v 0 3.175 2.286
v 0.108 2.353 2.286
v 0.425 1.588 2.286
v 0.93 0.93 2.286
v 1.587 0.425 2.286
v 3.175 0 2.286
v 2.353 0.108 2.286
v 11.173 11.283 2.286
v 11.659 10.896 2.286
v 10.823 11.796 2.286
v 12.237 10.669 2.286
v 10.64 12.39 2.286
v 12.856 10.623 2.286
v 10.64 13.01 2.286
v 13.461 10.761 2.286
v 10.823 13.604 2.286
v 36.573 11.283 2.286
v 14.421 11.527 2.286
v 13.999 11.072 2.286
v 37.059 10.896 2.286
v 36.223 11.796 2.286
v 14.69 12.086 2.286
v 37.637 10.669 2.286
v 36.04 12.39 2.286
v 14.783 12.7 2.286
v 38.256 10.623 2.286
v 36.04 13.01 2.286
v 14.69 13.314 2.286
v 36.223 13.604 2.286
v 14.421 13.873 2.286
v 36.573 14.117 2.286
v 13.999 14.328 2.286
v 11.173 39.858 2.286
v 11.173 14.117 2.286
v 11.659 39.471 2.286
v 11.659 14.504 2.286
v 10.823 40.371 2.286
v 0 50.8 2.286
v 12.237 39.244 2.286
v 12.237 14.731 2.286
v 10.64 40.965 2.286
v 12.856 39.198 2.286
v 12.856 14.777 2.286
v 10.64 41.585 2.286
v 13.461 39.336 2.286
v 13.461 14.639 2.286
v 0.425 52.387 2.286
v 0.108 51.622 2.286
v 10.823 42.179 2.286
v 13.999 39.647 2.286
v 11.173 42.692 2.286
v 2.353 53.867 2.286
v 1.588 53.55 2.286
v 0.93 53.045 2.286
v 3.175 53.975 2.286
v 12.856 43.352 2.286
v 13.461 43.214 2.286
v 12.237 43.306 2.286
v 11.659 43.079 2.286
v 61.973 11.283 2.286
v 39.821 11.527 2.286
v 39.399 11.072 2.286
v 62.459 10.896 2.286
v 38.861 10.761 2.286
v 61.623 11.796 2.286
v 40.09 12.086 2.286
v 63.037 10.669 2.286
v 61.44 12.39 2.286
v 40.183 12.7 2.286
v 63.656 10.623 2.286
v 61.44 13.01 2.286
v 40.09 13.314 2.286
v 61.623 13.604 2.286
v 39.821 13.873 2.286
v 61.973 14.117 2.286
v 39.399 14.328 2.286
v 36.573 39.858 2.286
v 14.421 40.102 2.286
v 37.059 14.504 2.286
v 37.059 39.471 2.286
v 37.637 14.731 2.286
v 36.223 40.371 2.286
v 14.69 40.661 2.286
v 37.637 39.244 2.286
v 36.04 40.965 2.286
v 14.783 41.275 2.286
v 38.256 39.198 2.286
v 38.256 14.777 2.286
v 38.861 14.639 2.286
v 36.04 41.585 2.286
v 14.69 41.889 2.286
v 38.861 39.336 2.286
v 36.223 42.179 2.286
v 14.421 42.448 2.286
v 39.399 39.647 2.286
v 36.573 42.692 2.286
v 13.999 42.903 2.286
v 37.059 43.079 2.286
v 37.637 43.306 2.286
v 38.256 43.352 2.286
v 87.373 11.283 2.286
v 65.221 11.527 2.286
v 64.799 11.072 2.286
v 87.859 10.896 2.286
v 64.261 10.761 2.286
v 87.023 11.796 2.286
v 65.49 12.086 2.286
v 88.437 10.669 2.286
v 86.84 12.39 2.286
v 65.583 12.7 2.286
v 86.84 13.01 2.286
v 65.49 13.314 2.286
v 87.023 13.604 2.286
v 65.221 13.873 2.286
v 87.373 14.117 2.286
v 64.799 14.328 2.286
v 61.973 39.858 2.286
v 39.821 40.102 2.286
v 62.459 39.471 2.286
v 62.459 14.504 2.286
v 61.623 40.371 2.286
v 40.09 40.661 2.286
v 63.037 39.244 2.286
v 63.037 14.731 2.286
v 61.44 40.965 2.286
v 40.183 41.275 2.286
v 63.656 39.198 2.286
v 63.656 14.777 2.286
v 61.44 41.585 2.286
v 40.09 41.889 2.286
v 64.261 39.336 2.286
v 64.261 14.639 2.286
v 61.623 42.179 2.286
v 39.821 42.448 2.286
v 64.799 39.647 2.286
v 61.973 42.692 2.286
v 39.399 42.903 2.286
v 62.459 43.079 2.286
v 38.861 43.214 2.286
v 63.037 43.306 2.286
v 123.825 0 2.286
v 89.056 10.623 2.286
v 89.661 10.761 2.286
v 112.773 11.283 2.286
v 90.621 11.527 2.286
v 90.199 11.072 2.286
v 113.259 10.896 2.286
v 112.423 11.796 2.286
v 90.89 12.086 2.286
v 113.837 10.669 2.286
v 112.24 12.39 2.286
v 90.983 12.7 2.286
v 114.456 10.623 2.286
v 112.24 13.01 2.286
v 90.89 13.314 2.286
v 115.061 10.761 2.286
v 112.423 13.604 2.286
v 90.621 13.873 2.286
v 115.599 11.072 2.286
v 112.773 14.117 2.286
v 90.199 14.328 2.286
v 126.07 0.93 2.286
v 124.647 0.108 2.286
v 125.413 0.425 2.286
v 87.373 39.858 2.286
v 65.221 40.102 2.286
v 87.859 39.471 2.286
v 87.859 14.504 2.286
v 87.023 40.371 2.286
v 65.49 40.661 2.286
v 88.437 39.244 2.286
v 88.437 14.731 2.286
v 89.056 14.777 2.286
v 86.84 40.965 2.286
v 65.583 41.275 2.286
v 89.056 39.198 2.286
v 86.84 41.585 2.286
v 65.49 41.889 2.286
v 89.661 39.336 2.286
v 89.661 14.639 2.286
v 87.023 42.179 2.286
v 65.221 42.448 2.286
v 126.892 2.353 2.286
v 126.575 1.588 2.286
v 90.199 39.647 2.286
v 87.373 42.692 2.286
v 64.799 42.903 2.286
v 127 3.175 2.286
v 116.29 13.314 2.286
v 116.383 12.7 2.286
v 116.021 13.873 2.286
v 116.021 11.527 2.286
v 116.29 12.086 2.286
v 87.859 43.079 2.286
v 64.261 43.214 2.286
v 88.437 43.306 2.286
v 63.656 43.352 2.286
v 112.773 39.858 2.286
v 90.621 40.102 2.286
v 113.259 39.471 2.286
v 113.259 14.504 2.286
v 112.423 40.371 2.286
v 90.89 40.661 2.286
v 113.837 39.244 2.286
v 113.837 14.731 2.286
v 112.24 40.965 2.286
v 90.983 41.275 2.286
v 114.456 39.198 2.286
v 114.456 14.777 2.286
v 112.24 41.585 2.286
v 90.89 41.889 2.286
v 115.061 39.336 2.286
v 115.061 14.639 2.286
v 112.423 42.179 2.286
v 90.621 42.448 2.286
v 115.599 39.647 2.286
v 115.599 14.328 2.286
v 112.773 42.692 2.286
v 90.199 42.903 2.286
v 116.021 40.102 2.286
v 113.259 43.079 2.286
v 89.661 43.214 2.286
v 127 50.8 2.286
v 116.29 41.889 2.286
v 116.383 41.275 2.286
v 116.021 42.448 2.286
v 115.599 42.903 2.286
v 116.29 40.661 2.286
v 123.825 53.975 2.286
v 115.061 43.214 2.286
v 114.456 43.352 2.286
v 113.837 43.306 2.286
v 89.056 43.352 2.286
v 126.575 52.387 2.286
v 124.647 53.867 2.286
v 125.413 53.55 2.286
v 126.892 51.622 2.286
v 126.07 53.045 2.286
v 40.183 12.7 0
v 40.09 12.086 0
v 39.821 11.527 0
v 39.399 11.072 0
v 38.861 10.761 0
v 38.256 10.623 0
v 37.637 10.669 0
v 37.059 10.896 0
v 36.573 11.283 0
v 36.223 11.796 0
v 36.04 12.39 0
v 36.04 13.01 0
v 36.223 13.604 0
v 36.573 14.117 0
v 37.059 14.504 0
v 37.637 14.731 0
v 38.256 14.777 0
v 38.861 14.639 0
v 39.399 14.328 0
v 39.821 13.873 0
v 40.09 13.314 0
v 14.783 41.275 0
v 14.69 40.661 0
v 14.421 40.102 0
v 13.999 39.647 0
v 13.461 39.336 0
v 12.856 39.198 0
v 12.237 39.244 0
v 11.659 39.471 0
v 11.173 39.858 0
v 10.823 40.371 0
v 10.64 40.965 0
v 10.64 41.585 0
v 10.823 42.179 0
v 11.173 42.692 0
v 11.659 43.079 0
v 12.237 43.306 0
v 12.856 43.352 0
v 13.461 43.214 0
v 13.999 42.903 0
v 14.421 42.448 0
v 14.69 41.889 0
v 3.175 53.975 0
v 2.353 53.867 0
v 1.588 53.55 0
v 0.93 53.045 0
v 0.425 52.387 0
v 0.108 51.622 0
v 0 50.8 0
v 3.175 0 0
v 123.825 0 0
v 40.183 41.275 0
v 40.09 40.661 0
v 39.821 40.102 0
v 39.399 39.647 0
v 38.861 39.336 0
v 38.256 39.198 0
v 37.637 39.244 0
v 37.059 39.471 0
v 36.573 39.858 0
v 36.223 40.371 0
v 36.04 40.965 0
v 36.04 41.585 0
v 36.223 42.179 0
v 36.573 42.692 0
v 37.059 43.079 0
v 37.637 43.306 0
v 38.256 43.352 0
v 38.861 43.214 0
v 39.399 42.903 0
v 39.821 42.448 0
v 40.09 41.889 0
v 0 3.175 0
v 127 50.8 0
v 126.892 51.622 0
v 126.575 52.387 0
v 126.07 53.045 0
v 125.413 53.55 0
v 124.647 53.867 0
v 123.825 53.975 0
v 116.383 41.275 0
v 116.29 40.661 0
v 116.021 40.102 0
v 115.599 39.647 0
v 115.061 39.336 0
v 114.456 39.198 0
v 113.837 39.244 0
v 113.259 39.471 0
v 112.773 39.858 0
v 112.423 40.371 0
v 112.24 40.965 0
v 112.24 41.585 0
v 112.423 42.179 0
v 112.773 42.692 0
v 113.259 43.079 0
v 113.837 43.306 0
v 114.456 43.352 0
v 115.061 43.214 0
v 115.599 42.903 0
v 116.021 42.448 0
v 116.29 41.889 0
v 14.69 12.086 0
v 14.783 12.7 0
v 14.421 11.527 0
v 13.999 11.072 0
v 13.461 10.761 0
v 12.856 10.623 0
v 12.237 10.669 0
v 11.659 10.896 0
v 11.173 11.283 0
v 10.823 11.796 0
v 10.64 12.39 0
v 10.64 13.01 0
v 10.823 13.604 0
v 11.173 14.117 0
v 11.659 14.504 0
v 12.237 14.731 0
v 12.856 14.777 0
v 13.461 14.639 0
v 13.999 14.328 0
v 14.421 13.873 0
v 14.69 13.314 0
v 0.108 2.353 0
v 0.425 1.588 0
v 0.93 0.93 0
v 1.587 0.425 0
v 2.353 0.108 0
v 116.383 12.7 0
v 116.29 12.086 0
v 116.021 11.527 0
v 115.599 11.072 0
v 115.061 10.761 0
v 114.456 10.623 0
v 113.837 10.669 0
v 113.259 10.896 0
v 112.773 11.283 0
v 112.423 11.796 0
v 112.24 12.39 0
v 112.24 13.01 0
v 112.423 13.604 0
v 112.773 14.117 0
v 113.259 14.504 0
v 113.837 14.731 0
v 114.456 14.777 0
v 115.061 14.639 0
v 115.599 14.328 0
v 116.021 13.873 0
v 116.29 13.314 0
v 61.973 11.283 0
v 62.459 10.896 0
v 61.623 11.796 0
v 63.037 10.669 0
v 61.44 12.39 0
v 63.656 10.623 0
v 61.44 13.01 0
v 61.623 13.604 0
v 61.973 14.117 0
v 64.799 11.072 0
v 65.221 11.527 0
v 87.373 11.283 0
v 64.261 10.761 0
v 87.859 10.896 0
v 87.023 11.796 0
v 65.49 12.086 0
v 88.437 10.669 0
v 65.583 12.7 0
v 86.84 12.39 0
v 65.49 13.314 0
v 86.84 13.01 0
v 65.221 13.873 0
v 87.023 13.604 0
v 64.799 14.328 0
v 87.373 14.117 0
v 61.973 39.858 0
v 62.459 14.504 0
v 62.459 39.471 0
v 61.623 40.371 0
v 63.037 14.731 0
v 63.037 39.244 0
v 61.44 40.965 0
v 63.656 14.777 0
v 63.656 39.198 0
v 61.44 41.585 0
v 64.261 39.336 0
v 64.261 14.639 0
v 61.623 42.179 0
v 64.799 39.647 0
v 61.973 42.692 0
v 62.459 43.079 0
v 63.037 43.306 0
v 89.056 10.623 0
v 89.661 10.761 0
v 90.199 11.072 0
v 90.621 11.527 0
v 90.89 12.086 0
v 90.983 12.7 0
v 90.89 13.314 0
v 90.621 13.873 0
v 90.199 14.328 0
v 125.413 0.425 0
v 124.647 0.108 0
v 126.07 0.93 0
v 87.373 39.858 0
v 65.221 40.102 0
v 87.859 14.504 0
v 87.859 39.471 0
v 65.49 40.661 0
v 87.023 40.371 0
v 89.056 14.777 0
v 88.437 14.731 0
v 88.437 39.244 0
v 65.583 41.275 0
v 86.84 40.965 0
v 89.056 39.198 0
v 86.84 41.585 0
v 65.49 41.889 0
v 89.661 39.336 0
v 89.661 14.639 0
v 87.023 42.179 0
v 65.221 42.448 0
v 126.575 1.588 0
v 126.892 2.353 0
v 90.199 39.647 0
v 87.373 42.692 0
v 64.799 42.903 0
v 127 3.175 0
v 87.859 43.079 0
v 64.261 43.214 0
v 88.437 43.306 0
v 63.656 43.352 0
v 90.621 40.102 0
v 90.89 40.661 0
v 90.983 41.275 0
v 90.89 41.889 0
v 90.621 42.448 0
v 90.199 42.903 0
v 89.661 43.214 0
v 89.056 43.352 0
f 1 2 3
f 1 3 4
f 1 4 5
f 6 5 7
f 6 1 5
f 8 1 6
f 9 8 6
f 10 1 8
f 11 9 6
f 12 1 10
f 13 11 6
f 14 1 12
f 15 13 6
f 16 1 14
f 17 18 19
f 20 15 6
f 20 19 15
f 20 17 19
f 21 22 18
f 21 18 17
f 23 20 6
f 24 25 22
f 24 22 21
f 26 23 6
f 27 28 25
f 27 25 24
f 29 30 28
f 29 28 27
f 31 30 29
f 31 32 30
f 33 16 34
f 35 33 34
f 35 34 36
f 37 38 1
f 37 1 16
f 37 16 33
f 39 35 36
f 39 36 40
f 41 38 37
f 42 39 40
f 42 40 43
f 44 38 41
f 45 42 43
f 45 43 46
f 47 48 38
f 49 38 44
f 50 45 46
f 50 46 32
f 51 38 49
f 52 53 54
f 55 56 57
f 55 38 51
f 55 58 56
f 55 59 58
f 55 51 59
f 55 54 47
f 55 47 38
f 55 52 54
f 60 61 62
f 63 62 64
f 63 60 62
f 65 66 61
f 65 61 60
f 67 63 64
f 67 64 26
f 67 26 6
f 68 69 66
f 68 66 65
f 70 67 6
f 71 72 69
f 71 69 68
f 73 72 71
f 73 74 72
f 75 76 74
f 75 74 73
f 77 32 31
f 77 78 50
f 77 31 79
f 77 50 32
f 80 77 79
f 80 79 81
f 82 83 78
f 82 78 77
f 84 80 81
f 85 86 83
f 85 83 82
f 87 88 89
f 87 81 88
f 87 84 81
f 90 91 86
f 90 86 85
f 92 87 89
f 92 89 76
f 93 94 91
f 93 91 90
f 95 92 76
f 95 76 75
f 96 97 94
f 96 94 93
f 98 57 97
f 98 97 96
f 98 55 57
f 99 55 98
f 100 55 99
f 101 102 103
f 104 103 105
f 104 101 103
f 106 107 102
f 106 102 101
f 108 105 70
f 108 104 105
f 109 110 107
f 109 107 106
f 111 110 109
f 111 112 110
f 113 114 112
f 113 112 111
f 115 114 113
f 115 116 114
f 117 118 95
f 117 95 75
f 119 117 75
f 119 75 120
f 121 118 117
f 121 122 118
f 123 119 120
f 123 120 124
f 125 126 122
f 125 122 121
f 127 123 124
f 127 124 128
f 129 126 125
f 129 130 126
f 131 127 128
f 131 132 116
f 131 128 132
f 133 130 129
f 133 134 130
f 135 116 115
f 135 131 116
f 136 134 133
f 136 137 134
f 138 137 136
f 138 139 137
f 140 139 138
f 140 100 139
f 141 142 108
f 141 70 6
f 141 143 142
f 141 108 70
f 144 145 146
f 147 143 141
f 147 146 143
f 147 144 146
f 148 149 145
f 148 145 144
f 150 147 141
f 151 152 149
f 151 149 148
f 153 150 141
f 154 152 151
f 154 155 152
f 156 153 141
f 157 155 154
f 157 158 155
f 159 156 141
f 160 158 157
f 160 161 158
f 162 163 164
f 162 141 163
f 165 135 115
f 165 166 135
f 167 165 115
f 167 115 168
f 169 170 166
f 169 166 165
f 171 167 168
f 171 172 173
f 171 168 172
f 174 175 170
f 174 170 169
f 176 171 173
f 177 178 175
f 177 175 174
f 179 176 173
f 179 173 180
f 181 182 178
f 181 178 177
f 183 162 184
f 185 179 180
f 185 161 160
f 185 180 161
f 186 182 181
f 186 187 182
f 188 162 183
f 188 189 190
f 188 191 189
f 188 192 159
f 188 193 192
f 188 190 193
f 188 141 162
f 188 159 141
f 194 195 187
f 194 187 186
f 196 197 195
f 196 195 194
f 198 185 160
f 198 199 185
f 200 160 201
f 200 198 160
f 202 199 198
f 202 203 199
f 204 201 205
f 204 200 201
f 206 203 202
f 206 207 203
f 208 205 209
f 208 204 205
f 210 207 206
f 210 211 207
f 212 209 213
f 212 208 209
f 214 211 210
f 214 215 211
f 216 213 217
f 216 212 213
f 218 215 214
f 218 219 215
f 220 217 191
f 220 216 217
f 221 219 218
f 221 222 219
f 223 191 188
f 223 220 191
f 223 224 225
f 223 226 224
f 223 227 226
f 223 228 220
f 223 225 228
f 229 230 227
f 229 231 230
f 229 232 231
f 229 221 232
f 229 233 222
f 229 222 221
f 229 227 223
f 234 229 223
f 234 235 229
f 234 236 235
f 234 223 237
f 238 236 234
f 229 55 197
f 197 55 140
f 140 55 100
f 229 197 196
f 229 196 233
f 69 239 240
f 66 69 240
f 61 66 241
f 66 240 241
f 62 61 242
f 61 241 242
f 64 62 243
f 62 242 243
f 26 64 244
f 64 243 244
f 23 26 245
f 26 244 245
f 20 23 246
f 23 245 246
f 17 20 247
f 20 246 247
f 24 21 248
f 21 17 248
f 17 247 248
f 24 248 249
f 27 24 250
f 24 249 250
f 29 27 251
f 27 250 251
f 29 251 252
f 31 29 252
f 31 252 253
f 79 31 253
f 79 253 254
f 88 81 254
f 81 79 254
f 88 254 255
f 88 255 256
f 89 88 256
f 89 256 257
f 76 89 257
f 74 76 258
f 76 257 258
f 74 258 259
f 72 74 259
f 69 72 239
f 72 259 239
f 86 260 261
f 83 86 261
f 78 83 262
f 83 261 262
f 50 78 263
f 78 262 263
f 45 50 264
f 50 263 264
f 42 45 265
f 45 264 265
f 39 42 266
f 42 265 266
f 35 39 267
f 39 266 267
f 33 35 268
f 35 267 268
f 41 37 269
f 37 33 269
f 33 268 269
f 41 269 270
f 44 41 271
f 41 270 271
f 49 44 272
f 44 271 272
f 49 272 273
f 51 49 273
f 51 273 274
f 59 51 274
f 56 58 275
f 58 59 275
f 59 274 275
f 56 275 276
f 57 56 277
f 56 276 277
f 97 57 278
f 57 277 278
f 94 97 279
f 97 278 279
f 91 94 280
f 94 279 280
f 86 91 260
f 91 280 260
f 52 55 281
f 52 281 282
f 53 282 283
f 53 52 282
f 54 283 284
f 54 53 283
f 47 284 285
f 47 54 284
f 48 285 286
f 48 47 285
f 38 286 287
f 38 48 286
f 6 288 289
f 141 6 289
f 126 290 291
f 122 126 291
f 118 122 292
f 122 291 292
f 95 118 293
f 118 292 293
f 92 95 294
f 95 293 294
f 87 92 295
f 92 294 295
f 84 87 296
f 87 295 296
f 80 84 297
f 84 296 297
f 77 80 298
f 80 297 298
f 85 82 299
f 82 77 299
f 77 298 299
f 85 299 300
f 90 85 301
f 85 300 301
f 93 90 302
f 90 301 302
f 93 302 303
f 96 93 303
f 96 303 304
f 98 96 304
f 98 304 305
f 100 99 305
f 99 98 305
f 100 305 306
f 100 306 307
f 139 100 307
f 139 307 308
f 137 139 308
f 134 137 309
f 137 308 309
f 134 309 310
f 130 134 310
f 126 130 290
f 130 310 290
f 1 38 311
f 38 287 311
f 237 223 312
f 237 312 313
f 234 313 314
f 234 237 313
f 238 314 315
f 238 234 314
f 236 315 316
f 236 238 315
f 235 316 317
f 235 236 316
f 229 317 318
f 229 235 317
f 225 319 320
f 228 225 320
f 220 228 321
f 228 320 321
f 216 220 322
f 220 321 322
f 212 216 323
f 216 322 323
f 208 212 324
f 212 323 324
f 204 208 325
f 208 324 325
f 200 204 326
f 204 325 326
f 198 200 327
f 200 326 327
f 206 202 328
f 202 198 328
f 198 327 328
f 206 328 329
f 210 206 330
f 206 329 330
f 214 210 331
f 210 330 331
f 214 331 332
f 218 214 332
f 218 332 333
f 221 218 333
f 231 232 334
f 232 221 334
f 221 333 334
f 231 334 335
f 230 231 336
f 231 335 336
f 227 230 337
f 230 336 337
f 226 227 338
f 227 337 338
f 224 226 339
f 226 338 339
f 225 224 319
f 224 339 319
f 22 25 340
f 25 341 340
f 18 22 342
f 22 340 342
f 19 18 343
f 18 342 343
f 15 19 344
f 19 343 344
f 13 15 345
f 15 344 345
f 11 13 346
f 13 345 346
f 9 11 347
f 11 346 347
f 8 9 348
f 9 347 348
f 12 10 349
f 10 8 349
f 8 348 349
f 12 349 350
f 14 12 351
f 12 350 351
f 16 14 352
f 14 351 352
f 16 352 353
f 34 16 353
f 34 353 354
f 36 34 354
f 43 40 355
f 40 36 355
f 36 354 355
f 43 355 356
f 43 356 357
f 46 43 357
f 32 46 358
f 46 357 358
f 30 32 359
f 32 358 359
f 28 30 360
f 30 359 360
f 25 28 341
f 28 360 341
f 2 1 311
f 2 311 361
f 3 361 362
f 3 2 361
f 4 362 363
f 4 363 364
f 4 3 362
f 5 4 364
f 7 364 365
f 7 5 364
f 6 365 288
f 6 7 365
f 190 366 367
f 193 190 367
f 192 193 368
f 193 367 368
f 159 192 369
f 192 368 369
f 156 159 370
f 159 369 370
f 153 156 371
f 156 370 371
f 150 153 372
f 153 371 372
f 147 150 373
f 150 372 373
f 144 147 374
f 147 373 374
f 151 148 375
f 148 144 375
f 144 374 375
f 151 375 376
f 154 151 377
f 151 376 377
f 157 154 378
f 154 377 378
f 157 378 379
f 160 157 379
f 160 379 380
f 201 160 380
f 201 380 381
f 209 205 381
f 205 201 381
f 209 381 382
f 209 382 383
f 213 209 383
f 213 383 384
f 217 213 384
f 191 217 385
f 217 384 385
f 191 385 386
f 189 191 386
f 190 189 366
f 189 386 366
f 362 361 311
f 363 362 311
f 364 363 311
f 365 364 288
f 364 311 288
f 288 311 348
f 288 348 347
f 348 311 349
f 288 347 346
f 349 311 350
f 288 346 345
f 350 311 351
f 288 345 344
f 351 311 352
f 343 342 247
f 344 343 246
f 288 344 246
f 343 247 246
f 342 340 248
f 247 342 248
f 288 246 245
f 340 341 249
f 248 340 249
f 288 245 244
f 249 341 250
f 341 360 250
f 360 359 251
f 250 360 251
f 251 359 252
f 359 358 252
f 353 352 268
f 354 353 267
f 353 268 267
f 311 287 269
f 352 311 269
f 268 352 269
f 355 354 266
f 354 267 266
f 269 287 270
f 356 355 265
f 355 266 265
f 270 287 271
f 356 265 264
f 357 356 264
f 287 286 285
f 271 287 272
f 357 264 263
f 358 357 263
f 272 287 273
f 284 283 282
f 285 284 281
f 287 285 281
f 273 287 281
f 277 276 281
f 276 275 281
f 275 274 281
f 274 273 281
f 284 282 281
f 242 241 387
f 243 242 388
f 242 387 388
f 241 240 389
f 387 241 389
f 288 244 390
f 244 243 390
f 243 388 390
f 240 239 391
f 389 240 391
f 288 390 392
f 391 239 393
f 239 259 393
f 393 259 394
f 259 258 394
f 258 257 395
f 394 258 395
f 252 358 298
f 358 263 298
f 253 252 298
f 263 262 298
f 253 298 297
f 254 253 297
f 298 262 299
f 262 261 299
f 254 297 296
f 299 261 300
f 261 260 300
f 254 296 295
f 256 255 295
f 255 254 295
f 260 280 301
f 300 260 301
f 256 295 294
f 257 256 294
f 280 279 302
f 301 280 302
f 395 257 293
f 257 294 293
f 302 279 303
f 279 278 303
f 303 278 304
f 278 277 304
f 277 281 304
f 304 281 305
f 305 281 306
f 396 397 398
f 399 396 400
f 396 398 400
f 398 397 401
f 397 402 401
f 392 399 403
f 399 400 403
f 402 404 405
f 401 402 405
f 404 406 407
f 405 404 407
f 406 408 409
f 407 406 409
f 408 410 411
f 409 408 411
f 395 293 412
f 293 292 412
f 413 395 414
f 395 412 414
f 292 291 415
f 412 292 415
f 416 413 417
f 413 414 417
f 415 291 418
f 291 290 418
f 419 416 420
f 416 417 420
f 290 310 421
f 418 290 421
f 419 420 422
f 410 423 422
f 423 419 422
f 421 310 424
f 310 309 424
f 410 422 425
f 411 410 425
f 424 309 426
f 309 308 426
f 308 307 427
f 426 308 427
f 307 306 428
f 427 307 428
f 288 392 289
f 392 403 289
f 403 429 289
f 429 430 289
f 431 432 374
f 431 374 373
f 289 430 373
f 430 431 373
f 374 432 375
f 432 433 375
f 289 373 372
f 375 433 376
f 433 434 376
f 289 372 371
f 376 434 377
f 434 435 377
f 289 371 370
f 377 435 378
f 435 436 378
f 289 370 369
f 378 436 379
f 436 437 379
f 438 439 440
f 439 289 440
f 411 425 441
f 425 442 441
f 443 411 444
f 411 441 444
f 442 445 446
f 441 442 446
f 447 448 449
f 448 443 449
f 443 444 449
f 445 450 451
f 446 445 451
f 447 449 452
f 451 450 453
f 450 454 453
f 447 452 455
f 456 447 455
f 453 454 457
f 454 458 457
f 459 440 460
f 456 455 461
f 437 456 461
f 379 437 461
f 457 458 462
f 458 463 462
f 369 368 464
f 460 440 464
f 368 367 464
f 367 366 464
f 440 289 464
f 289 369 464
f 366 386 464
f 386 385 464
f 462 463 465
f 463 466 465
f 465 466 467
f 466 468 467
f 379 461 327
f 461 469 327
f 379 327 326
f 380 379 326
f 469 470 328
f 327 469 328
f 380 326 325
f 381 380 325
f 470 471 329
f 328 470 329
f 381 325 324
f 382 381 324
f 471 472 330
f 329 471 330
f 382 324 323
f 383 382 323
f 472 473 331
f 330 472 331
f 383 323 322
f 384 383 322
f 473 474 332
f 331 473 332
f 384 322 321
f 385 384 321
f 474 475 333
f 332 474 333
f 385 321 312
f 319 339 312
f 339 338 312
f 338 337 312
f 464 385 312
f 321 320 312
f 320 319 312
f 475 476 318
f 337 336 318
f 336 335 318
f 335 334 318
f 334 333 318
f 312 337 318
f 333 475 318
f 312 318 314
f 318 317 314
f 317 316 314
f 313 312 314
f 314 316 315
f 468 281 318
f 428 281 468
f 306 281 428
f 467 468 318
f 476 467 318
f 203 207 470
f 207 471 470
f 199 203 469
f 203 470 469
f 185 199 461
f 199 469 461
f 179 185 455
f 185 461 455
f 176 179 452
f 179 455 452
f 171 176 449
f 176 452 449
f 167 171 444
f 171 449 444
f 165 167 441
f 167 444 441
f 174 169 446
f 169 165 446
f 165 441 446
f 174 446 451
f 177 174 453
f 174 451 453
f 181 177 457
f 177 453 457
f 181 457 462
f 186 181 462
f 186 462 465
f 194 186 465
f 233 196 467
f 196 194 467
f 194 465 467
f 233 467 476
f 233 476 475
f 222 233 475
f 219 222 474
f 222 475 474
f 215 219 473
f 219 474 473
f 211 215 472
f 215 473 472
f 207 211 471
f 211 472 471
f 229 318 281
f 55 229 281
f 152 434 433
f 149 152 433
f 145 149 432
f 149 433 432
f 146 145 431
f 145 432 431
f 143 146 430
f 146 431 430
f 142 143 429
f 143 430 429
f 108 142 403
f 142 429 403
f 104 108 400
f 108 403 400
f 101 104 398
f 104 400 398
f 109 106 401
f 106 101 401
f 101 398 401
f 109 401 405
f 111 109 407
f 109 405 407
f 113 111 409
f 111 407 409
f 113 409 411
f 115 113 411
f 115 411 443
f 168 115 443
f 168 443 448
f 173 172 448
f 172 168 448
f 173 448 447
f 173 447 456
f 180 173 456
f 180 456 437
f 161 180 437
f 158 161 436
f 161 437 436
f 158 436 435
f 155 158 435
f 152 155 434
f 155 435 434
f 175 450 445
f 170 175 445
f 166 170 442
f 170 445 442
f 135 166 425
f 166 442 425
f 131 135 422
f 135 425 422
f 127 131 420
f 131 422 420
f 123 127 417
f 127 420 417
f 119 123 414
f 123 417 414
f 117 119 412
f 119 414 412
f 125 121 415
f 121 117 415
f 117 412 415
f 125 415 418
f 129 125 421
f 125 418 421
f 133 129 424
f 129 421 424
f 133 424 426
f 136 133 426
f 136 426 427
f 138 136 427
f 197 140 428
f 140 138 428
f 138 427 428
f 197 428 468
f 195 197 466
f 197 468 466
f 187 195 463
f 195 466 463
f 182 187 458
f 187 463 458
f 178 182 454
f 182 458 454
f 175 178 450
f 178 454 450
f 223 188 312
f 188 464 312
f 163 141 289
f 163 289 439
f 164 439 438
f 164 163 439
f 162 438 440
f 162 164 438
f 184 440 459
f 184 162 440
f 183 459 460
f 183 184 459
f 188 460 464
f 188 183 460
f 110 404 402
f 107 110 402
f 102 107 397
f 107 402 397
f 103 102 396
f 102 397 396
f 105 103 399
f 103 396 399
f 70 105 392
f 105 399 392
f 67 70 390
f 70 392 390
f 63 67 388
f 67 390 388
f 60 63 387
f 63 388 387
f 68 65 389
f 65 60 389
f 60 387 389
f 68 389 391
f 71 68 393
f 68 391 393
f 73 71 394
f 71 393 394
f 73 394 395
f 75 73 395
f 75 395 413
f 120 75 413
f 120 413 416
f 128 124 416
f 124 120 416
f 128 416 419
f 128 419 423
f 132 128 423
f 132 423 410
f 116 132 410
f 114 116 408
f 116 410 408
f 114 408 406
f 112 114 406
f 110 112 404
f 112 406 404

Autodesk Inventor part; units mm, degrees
ref_plane "YZ Plane" through (0, 0, 0) normal (1, 0, 0) x (0, 1, 0)
ref_plane "XZ Plane" through (0, 0, 0) normal (0, 1, 0) x (-1, 0, 0)
ref_plane "XY Plane" through (0, 0, 0) normal (0, 0, 1) x (1, 0, 0)
sketch "Sketch1" plane through (0, 0, 0) normal (0, 0, 1) x (1, 0, 0)
  line L0 (0, 0) -> (127, 0)
  line L1 (127, 0) -> (127, 53.975)
  line L2 (127, 53.975) -> (0, 53.975)
  line L3 (0, 53.975) -> (0, 0)
  line L4 (0, 53.975) -> (127, 53.975) construction
  line L5 (127, 53.975) -> (127, 26.9875) construction
  line L6 (127, 26.9875) -> (0, 26.9875) construction
  line L7 (0, 26.9875) -> (0, 53.975) construction
  circle A0 centre (114.3, 41.275) radius 2.0828
  circle A1 centre (88.9, 41.275) radius 2.0828
  circle A2 centre (63.5, 41.275) radius 2.0828
  line L8 (0, 26.9875) -> (127, 26.9875) construction
  circle A3 centre (114.3, 12.7) radius 2.0828
  circle A4 centre (88.9, 12.7) radius 2.0828
  circle A5 centre (63.5, 12.7) radius 2.0828
  circle A6 centre (38.1, 41.275) radius 2.0828
  circle A7 centre (12.7, 41.275) radius 2.0828
  circle A8 centre (38.1, 12.7) radius 2.0828
  circle A9 centre (12.7, 12.7) radius 2.0828
  dimension "d0" = 127
  dimension "d1" = 53.975
  dimension "d2" = 26.9875
  dimension "d3" = 4.1656
  dimension "d4" = 12.7
  dimension "d7" = 25.4
  dimension "d12" = 12.7
extrude "Plate1" add sketch "Sketch1" along normal blind 2.286
fillet "Fillet1" radius 3.175 4 edges at (127, 53.975, 1.143) (0, 53.975, 1.143) (127, 0, 1.143) (0, 0, 1.143)
equation "\"d2\" = 0.5 * d1"
equation "\"BendRadius\" = Thickness"
equation "\"BendReliefWidth\" = Thickness"
equation "\"BendReliefDepth\" = 0.5 * Thickness"
equation "\"CornerReliefSize\" = 4 * Thickness"
equation "\"MinimumRemnant\" = 2 * Thickness"
equation "\"TransitionRadius\" = BendRadius"
equation "\"JacobiRadiusSize\" = BendRadius"
equation "\"GapSize\" = Thickness"
equation "\"d13\" = BendRadius"
equation "\"Thickness\" = 2.286"
properties part number "Support for Connect Arm to Funnel  (Custom)" material "Aluminum 6061"
